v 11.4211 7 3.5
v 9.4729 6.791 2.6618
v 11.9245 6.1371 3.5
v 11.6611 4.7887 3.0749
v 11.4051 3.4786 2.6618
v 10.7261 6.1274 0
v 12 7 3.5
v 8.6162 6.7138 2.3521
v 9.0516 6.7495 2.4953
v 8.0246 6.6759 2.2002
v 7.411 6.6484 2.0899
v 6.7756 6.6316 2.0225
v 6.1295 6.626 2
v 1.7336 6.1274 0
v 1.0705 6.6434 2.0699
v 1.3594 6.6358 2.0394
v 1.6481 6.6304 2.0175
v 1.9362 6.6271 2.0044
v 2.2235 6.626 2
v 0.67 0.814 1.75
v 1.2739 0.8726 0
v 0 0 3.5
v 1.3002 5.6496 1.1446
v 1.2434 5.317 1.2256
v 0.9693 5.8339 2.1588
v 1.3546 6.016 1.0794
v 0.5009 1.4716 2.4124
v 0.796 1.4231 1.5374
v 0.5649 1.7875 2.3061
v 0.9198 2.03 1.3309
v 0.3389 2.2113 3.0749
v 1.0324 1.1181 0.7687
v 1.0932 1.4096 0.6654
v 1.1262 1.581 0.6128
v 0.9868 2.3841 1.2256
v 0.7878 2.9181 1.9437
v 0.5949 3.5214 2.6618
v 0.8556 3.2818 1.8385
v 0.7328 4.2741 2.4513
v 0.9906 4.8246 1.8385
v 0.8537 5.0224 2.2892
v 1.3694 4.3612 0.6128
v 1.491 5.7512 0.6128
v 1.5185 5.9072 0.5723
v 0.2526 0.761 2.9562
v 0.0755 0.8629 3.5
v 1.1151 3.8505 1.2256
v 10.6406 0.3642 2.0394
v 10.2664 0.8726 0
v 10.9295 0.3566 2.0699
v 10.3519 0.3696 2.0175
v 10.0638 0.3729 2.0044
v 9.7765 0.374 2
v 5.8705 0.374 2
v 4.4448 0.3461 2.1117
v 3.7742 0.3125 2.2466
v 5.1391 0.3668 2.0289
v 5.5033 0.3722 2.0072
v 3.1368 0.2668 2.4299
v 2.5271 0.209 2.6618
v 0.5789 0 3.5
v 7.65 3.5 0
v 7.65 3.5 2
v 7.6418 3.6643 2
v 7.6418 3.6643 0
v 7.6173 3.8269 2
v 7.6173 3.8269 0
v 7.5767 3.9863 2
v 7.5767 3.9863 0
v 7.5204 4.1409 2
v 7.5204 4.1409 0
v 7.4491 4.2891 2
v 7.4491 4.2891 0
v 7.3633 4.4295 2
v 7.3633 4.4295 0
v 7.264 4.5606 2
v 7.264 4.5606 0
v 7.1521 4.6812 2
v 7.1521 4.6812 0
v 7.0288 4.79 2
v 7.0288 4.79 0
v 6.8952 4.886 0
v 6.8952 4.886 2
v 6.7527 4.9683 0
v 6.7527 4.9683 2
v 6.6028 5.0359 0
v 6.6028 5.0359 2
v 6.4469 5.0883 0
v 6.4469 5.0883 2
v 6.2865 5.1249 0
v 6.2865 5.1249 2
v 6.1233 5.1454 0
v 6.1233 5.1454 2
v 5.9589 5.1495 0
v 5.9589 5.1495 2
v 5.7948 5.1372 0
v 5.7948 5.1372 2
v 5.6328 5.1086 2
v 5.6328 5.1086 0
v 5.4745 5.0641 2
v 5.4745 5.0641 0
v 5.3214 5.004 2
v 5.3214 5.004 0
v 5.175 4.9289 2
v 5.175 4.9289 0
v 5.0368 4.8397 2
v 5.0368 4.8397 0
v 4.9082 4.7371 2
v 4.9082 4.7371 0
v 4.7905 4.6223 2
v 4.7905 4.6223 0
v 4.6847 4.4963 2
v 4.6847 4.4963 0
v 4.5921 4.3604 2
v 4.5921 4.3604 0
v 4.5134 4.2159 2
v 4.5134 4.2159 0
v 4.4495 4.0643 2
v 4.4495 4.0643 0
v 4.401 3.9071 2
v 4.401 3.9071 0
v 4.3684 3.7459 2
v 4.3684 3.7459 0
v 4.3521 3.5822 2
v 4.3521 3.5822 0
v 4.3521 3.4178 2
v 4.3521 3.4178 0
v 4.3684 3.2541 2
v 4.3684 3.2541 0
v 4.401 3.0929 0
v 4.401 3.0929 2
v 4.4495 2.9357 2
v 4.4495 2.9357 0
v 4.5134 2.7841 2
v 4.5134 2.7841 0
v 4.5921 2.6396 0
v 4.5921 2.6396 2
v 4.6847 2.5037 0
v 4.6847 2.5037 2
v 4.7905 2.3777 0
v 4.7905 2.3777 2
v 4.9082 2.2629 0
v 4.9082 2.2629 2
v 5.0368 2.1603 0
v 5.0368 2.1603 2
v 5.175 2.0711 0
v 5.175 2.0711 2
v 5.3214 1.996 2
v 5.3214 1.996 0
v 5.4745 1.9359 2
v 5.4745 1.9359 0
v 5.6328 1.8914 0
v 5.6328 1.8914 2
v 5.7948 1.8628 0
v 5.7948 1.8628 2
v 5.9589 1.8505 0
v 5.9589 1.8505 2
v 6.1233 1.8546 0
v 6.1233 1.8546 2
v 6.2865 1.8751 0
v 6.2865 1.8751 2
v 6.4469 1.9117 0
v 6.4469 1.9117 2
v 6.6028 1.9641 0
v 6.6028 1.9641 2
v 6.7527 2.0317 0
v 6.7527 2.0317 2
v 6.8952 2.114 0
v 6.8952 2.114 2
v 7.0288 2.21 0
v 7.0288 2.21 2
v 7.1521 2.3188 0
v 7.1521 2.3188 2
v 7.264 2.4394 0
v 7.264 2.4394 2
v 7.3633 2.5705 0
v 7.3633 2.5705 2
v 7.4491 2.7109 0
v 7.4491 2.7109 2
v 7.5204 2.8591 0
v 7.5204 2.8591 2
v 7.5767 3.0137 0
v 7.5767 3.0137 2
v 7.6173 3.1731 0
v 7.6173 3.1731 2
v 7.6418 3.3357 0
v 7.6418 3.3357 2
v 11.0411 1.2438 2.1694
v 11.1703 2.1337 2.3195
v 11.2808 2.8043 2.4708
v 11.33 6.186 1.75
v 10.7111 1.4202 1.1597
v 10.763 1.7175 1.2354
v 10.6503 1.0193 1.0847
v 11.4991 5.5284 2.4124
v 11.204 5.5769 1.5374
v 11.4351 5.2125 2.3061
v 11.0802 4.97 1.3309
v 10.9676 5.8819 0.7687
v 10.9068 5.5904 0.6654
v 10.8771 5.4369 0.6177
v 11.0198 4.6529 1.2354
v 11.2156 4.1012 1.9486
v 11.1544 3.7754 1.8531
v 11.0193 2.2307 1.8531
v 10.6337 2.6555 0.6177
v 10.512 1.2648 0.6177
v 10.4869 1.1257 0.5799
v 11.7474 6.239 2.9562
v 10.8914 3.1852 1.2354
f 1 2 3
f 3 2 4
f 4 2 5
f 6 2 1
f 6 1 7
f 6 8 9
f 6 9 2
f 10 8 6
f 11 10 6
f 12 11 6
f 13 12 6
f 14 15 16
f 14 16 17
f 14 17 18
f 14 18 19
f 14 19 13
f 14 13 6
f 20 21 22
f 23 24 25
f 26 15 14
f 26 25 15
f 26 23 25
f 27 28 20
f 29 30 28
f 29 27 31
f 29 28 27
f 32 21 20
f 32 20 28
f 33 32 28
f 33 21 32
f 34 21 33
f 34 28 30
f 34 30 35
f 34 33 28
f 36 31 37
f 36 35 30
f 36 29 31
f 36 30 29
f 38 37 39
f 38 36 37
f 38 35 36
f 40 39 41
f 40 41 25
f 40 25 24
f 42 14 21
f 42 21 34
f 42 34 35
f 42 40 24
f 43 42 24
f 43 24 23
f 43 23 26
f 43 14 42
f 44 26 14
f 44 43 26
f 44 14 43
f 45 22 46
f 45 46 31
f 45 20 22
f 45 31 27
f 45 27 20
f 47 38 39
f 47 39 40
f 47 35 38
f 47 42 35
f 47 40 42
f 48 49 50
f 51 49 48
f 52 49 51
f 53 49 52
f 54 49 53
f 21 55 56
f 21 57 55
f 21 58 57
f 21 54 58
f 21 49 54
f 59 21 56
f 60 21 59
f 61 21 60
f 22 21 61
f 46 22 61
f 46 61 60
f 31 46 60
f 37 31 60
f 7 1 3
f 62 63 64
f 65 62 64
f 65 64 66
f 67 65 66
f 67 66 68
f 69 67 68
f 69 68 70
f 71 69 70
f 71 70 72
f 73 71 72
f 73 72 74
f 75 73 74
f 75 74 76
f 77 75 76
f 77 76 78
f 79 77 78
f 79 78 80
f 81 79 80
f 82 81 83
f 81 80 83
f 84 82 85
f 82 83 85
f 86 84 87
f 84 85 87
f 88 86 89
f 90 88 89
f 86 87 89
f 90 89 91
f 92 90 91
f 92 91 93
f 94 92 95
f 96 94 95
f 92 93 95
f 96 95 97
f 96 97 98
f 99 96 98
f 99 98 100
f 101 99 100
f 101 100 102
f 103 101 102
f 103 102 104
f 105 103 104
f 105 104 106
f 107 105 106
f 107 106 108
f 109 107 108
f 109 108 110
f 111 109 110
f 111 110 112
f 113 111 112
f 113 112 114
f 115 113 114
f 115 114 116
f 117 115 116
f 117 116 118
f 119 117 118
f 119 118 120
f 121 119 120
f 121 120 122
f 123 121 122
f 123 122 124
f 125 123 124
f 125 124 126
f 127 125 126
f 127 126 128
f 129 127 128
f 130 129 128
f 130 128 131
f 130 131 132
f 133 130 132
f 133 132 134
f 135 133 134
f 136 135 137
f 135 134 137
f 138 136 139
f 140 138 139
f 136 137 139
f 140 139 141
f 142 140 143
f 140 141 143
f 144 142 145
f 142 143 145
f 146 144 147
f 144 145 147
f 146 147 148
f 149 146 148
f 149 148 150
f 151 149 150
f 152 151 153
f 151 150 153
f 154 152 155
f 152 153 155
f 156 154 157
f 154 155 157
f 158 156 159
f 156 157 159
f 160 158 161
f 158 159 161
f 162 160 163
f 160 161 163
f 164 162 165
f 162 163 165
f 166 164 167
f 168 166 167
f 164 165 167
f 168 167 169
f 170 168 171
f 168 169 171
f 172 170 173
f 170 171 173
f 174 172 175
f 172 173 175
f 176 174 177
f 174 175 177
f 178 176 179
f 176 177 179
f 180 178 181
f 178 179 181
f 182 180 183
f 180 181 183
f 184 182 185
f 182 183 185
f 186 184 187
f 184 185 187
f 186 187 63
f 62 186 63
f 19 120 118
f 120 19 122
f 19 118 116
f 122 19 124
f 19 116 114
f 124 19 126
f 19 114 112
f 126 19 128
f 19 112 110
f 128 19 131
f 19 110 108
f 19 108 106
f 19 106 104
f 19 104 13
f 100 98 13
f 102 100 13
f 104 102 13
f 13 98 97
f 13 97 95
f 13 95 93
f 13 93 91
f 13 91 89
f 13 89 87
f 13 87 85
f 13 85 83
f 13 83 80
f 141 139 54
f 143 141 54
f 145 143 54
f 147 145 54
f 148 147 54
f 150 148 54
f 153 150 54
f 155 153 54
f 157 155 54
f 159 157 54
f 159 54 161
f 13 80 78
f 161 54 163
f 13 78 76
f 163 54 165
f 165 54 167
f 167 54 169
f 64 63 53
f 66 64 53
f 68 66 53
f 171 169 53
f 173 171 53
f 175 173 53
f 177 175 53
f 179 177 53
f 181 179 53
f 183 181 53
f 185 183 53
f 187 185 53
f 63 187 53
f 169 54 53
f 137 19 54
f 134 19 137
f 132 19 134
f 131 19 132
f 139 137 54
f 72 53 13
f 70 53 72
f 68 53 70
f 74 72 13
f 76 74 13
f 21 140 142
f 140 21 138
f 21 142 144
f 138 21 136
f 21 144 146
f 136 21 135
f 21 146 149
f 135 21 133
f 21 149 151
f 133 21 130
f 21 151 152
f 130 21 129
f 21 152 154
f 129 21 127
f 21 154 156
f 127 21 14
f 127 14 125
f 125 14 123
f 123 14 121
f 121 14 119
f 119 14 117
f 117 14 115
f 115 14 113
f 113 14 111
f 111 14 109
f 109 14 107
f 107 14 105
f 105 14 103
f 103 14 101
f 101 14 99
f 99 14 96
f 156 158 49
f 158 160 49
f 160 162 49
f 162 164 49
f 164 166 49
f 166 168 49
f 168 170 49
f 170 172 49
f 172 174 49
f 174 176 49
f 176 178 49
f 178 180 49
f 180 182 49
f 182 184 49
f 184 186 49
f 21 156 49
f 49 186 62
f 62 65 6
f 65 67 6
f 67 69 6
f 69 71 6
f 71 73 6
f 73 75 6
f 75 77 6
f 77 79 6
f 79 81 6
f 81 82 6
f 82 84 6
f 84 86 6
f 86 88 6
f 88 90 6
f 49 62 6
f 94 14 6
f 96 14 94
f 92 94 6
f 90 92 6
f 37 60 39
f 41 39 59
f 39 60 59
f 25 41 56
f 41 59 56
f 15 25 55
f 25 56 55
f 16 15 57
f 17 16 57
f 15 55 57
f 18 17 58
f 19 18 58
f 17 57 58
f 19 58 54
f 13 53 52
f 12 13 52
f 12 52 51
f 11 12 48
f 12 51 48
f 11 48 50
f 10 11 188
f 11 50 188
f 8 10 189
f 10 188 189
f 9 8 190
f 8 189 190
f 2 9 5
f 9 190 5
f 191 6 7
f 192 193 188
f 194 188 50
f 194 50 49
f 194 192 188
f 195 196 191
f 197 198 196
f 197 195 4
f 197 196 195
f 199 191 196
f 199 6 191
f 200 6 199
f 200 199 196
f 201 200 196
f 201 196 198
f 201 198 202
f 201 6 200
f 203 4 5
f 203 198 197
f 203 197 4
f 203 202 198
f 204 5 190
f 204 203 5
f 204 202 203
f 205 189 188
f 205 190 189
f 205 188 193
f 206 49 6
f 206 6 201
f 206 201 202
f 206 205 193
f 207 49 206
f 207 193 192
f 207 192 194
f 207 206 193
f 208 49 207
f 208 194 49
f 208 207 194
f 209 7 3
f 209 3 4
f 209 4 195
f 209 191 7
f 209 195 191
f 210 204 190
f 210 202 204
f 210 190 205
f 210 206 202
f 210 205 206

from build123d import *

# Parameters (mm, degrees)
F0_W      = 12
F0_H      = 7
F1_DEPTH  = 3.5
F3_DEPTH  = 7.001
F5_DEPTH  = 12.001
F12_DEPTH = 12.5
F13_R     = 1.65
F14_DEPTH = 2.0010001
F15_R     = 7


with BuildPart() as f1:
    # F0 (on Top) → F1 (new body)
    with BuildSketch(Plane.XY):
        with Locations((6, 3.5)):
            Rectangle(F0_W, F0_H)
    extrude(amount=F1_DEPTH)

    # F2 (on face) → F3 (cut, through all)
    with BuildSketch(Plane.XZ):
        Polygon((1.2738958199, 0), (0, 3.5), (0, 0), align=None)
        Polygon((12, 0), (12, 3.5), (10.7261041801, 0), align=None)
    extrude(amount=-F3_DEPTH, mode=Mode.SUBTRACT)

    # F4 (on Right) → F5 (cut, through all)
    with BuildSketch(Plane.YZ):
        Polygon((0.87264801, 0), (0, 3.5), (0, 0), align=None)
        Polygon((6.12735199, 0), (7, 0), (7, 3.5), align=None)
    extrude(amount=F5_DEPTH, mode=Mode.SUBTRACT)

    # F6 (on face) → F8 section 0
    with BuildSketch(Plane.XY.offset(3.5)):
        Polygon((0, 7), (0, 0), (0.6124206447, 7), align=None)
    # F7 (on face) → F8 section 1
    with BuildSketch(Plane(origin=(0, 0, 0), x_dir=(1, 0, 0), z_dir=(0, 0, -1))):
        Polygon((1.2738958199, -0.87264801), (1.2738958199, -6.12735199), (1.7336228484, -6.12735199), align=None)
    loft(mode=Mode.SUBTRACT)

    # F6 (on face) → F9 section 0
    with BuildSketch(Plane.XY.offset(3.5)):
        Polygon((12, 7), (11.3875793553, 0), (12, 0), align=None)
    # F7 (on face) → F9 section 1
    with BuildSketch(Plane(origin=(0, 0, 0), x_dir=(1, 0, 0), z_dir=(0, 0, -1))):
        Polygon((10.7261041801, -0.87264801), (10.2663771516, -0.87264801), (10.7261041801, -6.12735199), align=None)
    loft(mode=Mode.SUBTRACT)

    # F11 (on 3pt) → F12 (cut, symmetric)
    with BuildSketch(Plane(origin=(0, 0, 0), x_dir=(0.8637789009, 0.5038710255, 0), z_dir=(0.5038710255, -0.8637789009, 0))):
        Polygon((9.8363507794, 3.5), (0.5, 3.5), (3.7, 2), (6.9462219947, 2), (10.1924439894, 2), (13.3924439894, 3.5), align=None)
    extrude(amount=F12_DEPTH, both=True, mode=Mode.SUBTRACT)

    # F13 (on face) → F14 (cut, through all)
    with BuildSketch(Plane.XY.offset(2)):
        with Locations((6, 3.5)):
            Circle(F13_R)
    extrude(amount=-F14_DEPTH, mode=Mode.SUBTRACT)

    # F15
    f15_edges = [f1.edges().sort_by_distance(p)[0] for p in [
        (2.535148, 2.997181, 2),
        (9.464852, 4.002819, 2),
    ]]
    fillet(f15_edges, radius=F15_R)


solid = f1.part
